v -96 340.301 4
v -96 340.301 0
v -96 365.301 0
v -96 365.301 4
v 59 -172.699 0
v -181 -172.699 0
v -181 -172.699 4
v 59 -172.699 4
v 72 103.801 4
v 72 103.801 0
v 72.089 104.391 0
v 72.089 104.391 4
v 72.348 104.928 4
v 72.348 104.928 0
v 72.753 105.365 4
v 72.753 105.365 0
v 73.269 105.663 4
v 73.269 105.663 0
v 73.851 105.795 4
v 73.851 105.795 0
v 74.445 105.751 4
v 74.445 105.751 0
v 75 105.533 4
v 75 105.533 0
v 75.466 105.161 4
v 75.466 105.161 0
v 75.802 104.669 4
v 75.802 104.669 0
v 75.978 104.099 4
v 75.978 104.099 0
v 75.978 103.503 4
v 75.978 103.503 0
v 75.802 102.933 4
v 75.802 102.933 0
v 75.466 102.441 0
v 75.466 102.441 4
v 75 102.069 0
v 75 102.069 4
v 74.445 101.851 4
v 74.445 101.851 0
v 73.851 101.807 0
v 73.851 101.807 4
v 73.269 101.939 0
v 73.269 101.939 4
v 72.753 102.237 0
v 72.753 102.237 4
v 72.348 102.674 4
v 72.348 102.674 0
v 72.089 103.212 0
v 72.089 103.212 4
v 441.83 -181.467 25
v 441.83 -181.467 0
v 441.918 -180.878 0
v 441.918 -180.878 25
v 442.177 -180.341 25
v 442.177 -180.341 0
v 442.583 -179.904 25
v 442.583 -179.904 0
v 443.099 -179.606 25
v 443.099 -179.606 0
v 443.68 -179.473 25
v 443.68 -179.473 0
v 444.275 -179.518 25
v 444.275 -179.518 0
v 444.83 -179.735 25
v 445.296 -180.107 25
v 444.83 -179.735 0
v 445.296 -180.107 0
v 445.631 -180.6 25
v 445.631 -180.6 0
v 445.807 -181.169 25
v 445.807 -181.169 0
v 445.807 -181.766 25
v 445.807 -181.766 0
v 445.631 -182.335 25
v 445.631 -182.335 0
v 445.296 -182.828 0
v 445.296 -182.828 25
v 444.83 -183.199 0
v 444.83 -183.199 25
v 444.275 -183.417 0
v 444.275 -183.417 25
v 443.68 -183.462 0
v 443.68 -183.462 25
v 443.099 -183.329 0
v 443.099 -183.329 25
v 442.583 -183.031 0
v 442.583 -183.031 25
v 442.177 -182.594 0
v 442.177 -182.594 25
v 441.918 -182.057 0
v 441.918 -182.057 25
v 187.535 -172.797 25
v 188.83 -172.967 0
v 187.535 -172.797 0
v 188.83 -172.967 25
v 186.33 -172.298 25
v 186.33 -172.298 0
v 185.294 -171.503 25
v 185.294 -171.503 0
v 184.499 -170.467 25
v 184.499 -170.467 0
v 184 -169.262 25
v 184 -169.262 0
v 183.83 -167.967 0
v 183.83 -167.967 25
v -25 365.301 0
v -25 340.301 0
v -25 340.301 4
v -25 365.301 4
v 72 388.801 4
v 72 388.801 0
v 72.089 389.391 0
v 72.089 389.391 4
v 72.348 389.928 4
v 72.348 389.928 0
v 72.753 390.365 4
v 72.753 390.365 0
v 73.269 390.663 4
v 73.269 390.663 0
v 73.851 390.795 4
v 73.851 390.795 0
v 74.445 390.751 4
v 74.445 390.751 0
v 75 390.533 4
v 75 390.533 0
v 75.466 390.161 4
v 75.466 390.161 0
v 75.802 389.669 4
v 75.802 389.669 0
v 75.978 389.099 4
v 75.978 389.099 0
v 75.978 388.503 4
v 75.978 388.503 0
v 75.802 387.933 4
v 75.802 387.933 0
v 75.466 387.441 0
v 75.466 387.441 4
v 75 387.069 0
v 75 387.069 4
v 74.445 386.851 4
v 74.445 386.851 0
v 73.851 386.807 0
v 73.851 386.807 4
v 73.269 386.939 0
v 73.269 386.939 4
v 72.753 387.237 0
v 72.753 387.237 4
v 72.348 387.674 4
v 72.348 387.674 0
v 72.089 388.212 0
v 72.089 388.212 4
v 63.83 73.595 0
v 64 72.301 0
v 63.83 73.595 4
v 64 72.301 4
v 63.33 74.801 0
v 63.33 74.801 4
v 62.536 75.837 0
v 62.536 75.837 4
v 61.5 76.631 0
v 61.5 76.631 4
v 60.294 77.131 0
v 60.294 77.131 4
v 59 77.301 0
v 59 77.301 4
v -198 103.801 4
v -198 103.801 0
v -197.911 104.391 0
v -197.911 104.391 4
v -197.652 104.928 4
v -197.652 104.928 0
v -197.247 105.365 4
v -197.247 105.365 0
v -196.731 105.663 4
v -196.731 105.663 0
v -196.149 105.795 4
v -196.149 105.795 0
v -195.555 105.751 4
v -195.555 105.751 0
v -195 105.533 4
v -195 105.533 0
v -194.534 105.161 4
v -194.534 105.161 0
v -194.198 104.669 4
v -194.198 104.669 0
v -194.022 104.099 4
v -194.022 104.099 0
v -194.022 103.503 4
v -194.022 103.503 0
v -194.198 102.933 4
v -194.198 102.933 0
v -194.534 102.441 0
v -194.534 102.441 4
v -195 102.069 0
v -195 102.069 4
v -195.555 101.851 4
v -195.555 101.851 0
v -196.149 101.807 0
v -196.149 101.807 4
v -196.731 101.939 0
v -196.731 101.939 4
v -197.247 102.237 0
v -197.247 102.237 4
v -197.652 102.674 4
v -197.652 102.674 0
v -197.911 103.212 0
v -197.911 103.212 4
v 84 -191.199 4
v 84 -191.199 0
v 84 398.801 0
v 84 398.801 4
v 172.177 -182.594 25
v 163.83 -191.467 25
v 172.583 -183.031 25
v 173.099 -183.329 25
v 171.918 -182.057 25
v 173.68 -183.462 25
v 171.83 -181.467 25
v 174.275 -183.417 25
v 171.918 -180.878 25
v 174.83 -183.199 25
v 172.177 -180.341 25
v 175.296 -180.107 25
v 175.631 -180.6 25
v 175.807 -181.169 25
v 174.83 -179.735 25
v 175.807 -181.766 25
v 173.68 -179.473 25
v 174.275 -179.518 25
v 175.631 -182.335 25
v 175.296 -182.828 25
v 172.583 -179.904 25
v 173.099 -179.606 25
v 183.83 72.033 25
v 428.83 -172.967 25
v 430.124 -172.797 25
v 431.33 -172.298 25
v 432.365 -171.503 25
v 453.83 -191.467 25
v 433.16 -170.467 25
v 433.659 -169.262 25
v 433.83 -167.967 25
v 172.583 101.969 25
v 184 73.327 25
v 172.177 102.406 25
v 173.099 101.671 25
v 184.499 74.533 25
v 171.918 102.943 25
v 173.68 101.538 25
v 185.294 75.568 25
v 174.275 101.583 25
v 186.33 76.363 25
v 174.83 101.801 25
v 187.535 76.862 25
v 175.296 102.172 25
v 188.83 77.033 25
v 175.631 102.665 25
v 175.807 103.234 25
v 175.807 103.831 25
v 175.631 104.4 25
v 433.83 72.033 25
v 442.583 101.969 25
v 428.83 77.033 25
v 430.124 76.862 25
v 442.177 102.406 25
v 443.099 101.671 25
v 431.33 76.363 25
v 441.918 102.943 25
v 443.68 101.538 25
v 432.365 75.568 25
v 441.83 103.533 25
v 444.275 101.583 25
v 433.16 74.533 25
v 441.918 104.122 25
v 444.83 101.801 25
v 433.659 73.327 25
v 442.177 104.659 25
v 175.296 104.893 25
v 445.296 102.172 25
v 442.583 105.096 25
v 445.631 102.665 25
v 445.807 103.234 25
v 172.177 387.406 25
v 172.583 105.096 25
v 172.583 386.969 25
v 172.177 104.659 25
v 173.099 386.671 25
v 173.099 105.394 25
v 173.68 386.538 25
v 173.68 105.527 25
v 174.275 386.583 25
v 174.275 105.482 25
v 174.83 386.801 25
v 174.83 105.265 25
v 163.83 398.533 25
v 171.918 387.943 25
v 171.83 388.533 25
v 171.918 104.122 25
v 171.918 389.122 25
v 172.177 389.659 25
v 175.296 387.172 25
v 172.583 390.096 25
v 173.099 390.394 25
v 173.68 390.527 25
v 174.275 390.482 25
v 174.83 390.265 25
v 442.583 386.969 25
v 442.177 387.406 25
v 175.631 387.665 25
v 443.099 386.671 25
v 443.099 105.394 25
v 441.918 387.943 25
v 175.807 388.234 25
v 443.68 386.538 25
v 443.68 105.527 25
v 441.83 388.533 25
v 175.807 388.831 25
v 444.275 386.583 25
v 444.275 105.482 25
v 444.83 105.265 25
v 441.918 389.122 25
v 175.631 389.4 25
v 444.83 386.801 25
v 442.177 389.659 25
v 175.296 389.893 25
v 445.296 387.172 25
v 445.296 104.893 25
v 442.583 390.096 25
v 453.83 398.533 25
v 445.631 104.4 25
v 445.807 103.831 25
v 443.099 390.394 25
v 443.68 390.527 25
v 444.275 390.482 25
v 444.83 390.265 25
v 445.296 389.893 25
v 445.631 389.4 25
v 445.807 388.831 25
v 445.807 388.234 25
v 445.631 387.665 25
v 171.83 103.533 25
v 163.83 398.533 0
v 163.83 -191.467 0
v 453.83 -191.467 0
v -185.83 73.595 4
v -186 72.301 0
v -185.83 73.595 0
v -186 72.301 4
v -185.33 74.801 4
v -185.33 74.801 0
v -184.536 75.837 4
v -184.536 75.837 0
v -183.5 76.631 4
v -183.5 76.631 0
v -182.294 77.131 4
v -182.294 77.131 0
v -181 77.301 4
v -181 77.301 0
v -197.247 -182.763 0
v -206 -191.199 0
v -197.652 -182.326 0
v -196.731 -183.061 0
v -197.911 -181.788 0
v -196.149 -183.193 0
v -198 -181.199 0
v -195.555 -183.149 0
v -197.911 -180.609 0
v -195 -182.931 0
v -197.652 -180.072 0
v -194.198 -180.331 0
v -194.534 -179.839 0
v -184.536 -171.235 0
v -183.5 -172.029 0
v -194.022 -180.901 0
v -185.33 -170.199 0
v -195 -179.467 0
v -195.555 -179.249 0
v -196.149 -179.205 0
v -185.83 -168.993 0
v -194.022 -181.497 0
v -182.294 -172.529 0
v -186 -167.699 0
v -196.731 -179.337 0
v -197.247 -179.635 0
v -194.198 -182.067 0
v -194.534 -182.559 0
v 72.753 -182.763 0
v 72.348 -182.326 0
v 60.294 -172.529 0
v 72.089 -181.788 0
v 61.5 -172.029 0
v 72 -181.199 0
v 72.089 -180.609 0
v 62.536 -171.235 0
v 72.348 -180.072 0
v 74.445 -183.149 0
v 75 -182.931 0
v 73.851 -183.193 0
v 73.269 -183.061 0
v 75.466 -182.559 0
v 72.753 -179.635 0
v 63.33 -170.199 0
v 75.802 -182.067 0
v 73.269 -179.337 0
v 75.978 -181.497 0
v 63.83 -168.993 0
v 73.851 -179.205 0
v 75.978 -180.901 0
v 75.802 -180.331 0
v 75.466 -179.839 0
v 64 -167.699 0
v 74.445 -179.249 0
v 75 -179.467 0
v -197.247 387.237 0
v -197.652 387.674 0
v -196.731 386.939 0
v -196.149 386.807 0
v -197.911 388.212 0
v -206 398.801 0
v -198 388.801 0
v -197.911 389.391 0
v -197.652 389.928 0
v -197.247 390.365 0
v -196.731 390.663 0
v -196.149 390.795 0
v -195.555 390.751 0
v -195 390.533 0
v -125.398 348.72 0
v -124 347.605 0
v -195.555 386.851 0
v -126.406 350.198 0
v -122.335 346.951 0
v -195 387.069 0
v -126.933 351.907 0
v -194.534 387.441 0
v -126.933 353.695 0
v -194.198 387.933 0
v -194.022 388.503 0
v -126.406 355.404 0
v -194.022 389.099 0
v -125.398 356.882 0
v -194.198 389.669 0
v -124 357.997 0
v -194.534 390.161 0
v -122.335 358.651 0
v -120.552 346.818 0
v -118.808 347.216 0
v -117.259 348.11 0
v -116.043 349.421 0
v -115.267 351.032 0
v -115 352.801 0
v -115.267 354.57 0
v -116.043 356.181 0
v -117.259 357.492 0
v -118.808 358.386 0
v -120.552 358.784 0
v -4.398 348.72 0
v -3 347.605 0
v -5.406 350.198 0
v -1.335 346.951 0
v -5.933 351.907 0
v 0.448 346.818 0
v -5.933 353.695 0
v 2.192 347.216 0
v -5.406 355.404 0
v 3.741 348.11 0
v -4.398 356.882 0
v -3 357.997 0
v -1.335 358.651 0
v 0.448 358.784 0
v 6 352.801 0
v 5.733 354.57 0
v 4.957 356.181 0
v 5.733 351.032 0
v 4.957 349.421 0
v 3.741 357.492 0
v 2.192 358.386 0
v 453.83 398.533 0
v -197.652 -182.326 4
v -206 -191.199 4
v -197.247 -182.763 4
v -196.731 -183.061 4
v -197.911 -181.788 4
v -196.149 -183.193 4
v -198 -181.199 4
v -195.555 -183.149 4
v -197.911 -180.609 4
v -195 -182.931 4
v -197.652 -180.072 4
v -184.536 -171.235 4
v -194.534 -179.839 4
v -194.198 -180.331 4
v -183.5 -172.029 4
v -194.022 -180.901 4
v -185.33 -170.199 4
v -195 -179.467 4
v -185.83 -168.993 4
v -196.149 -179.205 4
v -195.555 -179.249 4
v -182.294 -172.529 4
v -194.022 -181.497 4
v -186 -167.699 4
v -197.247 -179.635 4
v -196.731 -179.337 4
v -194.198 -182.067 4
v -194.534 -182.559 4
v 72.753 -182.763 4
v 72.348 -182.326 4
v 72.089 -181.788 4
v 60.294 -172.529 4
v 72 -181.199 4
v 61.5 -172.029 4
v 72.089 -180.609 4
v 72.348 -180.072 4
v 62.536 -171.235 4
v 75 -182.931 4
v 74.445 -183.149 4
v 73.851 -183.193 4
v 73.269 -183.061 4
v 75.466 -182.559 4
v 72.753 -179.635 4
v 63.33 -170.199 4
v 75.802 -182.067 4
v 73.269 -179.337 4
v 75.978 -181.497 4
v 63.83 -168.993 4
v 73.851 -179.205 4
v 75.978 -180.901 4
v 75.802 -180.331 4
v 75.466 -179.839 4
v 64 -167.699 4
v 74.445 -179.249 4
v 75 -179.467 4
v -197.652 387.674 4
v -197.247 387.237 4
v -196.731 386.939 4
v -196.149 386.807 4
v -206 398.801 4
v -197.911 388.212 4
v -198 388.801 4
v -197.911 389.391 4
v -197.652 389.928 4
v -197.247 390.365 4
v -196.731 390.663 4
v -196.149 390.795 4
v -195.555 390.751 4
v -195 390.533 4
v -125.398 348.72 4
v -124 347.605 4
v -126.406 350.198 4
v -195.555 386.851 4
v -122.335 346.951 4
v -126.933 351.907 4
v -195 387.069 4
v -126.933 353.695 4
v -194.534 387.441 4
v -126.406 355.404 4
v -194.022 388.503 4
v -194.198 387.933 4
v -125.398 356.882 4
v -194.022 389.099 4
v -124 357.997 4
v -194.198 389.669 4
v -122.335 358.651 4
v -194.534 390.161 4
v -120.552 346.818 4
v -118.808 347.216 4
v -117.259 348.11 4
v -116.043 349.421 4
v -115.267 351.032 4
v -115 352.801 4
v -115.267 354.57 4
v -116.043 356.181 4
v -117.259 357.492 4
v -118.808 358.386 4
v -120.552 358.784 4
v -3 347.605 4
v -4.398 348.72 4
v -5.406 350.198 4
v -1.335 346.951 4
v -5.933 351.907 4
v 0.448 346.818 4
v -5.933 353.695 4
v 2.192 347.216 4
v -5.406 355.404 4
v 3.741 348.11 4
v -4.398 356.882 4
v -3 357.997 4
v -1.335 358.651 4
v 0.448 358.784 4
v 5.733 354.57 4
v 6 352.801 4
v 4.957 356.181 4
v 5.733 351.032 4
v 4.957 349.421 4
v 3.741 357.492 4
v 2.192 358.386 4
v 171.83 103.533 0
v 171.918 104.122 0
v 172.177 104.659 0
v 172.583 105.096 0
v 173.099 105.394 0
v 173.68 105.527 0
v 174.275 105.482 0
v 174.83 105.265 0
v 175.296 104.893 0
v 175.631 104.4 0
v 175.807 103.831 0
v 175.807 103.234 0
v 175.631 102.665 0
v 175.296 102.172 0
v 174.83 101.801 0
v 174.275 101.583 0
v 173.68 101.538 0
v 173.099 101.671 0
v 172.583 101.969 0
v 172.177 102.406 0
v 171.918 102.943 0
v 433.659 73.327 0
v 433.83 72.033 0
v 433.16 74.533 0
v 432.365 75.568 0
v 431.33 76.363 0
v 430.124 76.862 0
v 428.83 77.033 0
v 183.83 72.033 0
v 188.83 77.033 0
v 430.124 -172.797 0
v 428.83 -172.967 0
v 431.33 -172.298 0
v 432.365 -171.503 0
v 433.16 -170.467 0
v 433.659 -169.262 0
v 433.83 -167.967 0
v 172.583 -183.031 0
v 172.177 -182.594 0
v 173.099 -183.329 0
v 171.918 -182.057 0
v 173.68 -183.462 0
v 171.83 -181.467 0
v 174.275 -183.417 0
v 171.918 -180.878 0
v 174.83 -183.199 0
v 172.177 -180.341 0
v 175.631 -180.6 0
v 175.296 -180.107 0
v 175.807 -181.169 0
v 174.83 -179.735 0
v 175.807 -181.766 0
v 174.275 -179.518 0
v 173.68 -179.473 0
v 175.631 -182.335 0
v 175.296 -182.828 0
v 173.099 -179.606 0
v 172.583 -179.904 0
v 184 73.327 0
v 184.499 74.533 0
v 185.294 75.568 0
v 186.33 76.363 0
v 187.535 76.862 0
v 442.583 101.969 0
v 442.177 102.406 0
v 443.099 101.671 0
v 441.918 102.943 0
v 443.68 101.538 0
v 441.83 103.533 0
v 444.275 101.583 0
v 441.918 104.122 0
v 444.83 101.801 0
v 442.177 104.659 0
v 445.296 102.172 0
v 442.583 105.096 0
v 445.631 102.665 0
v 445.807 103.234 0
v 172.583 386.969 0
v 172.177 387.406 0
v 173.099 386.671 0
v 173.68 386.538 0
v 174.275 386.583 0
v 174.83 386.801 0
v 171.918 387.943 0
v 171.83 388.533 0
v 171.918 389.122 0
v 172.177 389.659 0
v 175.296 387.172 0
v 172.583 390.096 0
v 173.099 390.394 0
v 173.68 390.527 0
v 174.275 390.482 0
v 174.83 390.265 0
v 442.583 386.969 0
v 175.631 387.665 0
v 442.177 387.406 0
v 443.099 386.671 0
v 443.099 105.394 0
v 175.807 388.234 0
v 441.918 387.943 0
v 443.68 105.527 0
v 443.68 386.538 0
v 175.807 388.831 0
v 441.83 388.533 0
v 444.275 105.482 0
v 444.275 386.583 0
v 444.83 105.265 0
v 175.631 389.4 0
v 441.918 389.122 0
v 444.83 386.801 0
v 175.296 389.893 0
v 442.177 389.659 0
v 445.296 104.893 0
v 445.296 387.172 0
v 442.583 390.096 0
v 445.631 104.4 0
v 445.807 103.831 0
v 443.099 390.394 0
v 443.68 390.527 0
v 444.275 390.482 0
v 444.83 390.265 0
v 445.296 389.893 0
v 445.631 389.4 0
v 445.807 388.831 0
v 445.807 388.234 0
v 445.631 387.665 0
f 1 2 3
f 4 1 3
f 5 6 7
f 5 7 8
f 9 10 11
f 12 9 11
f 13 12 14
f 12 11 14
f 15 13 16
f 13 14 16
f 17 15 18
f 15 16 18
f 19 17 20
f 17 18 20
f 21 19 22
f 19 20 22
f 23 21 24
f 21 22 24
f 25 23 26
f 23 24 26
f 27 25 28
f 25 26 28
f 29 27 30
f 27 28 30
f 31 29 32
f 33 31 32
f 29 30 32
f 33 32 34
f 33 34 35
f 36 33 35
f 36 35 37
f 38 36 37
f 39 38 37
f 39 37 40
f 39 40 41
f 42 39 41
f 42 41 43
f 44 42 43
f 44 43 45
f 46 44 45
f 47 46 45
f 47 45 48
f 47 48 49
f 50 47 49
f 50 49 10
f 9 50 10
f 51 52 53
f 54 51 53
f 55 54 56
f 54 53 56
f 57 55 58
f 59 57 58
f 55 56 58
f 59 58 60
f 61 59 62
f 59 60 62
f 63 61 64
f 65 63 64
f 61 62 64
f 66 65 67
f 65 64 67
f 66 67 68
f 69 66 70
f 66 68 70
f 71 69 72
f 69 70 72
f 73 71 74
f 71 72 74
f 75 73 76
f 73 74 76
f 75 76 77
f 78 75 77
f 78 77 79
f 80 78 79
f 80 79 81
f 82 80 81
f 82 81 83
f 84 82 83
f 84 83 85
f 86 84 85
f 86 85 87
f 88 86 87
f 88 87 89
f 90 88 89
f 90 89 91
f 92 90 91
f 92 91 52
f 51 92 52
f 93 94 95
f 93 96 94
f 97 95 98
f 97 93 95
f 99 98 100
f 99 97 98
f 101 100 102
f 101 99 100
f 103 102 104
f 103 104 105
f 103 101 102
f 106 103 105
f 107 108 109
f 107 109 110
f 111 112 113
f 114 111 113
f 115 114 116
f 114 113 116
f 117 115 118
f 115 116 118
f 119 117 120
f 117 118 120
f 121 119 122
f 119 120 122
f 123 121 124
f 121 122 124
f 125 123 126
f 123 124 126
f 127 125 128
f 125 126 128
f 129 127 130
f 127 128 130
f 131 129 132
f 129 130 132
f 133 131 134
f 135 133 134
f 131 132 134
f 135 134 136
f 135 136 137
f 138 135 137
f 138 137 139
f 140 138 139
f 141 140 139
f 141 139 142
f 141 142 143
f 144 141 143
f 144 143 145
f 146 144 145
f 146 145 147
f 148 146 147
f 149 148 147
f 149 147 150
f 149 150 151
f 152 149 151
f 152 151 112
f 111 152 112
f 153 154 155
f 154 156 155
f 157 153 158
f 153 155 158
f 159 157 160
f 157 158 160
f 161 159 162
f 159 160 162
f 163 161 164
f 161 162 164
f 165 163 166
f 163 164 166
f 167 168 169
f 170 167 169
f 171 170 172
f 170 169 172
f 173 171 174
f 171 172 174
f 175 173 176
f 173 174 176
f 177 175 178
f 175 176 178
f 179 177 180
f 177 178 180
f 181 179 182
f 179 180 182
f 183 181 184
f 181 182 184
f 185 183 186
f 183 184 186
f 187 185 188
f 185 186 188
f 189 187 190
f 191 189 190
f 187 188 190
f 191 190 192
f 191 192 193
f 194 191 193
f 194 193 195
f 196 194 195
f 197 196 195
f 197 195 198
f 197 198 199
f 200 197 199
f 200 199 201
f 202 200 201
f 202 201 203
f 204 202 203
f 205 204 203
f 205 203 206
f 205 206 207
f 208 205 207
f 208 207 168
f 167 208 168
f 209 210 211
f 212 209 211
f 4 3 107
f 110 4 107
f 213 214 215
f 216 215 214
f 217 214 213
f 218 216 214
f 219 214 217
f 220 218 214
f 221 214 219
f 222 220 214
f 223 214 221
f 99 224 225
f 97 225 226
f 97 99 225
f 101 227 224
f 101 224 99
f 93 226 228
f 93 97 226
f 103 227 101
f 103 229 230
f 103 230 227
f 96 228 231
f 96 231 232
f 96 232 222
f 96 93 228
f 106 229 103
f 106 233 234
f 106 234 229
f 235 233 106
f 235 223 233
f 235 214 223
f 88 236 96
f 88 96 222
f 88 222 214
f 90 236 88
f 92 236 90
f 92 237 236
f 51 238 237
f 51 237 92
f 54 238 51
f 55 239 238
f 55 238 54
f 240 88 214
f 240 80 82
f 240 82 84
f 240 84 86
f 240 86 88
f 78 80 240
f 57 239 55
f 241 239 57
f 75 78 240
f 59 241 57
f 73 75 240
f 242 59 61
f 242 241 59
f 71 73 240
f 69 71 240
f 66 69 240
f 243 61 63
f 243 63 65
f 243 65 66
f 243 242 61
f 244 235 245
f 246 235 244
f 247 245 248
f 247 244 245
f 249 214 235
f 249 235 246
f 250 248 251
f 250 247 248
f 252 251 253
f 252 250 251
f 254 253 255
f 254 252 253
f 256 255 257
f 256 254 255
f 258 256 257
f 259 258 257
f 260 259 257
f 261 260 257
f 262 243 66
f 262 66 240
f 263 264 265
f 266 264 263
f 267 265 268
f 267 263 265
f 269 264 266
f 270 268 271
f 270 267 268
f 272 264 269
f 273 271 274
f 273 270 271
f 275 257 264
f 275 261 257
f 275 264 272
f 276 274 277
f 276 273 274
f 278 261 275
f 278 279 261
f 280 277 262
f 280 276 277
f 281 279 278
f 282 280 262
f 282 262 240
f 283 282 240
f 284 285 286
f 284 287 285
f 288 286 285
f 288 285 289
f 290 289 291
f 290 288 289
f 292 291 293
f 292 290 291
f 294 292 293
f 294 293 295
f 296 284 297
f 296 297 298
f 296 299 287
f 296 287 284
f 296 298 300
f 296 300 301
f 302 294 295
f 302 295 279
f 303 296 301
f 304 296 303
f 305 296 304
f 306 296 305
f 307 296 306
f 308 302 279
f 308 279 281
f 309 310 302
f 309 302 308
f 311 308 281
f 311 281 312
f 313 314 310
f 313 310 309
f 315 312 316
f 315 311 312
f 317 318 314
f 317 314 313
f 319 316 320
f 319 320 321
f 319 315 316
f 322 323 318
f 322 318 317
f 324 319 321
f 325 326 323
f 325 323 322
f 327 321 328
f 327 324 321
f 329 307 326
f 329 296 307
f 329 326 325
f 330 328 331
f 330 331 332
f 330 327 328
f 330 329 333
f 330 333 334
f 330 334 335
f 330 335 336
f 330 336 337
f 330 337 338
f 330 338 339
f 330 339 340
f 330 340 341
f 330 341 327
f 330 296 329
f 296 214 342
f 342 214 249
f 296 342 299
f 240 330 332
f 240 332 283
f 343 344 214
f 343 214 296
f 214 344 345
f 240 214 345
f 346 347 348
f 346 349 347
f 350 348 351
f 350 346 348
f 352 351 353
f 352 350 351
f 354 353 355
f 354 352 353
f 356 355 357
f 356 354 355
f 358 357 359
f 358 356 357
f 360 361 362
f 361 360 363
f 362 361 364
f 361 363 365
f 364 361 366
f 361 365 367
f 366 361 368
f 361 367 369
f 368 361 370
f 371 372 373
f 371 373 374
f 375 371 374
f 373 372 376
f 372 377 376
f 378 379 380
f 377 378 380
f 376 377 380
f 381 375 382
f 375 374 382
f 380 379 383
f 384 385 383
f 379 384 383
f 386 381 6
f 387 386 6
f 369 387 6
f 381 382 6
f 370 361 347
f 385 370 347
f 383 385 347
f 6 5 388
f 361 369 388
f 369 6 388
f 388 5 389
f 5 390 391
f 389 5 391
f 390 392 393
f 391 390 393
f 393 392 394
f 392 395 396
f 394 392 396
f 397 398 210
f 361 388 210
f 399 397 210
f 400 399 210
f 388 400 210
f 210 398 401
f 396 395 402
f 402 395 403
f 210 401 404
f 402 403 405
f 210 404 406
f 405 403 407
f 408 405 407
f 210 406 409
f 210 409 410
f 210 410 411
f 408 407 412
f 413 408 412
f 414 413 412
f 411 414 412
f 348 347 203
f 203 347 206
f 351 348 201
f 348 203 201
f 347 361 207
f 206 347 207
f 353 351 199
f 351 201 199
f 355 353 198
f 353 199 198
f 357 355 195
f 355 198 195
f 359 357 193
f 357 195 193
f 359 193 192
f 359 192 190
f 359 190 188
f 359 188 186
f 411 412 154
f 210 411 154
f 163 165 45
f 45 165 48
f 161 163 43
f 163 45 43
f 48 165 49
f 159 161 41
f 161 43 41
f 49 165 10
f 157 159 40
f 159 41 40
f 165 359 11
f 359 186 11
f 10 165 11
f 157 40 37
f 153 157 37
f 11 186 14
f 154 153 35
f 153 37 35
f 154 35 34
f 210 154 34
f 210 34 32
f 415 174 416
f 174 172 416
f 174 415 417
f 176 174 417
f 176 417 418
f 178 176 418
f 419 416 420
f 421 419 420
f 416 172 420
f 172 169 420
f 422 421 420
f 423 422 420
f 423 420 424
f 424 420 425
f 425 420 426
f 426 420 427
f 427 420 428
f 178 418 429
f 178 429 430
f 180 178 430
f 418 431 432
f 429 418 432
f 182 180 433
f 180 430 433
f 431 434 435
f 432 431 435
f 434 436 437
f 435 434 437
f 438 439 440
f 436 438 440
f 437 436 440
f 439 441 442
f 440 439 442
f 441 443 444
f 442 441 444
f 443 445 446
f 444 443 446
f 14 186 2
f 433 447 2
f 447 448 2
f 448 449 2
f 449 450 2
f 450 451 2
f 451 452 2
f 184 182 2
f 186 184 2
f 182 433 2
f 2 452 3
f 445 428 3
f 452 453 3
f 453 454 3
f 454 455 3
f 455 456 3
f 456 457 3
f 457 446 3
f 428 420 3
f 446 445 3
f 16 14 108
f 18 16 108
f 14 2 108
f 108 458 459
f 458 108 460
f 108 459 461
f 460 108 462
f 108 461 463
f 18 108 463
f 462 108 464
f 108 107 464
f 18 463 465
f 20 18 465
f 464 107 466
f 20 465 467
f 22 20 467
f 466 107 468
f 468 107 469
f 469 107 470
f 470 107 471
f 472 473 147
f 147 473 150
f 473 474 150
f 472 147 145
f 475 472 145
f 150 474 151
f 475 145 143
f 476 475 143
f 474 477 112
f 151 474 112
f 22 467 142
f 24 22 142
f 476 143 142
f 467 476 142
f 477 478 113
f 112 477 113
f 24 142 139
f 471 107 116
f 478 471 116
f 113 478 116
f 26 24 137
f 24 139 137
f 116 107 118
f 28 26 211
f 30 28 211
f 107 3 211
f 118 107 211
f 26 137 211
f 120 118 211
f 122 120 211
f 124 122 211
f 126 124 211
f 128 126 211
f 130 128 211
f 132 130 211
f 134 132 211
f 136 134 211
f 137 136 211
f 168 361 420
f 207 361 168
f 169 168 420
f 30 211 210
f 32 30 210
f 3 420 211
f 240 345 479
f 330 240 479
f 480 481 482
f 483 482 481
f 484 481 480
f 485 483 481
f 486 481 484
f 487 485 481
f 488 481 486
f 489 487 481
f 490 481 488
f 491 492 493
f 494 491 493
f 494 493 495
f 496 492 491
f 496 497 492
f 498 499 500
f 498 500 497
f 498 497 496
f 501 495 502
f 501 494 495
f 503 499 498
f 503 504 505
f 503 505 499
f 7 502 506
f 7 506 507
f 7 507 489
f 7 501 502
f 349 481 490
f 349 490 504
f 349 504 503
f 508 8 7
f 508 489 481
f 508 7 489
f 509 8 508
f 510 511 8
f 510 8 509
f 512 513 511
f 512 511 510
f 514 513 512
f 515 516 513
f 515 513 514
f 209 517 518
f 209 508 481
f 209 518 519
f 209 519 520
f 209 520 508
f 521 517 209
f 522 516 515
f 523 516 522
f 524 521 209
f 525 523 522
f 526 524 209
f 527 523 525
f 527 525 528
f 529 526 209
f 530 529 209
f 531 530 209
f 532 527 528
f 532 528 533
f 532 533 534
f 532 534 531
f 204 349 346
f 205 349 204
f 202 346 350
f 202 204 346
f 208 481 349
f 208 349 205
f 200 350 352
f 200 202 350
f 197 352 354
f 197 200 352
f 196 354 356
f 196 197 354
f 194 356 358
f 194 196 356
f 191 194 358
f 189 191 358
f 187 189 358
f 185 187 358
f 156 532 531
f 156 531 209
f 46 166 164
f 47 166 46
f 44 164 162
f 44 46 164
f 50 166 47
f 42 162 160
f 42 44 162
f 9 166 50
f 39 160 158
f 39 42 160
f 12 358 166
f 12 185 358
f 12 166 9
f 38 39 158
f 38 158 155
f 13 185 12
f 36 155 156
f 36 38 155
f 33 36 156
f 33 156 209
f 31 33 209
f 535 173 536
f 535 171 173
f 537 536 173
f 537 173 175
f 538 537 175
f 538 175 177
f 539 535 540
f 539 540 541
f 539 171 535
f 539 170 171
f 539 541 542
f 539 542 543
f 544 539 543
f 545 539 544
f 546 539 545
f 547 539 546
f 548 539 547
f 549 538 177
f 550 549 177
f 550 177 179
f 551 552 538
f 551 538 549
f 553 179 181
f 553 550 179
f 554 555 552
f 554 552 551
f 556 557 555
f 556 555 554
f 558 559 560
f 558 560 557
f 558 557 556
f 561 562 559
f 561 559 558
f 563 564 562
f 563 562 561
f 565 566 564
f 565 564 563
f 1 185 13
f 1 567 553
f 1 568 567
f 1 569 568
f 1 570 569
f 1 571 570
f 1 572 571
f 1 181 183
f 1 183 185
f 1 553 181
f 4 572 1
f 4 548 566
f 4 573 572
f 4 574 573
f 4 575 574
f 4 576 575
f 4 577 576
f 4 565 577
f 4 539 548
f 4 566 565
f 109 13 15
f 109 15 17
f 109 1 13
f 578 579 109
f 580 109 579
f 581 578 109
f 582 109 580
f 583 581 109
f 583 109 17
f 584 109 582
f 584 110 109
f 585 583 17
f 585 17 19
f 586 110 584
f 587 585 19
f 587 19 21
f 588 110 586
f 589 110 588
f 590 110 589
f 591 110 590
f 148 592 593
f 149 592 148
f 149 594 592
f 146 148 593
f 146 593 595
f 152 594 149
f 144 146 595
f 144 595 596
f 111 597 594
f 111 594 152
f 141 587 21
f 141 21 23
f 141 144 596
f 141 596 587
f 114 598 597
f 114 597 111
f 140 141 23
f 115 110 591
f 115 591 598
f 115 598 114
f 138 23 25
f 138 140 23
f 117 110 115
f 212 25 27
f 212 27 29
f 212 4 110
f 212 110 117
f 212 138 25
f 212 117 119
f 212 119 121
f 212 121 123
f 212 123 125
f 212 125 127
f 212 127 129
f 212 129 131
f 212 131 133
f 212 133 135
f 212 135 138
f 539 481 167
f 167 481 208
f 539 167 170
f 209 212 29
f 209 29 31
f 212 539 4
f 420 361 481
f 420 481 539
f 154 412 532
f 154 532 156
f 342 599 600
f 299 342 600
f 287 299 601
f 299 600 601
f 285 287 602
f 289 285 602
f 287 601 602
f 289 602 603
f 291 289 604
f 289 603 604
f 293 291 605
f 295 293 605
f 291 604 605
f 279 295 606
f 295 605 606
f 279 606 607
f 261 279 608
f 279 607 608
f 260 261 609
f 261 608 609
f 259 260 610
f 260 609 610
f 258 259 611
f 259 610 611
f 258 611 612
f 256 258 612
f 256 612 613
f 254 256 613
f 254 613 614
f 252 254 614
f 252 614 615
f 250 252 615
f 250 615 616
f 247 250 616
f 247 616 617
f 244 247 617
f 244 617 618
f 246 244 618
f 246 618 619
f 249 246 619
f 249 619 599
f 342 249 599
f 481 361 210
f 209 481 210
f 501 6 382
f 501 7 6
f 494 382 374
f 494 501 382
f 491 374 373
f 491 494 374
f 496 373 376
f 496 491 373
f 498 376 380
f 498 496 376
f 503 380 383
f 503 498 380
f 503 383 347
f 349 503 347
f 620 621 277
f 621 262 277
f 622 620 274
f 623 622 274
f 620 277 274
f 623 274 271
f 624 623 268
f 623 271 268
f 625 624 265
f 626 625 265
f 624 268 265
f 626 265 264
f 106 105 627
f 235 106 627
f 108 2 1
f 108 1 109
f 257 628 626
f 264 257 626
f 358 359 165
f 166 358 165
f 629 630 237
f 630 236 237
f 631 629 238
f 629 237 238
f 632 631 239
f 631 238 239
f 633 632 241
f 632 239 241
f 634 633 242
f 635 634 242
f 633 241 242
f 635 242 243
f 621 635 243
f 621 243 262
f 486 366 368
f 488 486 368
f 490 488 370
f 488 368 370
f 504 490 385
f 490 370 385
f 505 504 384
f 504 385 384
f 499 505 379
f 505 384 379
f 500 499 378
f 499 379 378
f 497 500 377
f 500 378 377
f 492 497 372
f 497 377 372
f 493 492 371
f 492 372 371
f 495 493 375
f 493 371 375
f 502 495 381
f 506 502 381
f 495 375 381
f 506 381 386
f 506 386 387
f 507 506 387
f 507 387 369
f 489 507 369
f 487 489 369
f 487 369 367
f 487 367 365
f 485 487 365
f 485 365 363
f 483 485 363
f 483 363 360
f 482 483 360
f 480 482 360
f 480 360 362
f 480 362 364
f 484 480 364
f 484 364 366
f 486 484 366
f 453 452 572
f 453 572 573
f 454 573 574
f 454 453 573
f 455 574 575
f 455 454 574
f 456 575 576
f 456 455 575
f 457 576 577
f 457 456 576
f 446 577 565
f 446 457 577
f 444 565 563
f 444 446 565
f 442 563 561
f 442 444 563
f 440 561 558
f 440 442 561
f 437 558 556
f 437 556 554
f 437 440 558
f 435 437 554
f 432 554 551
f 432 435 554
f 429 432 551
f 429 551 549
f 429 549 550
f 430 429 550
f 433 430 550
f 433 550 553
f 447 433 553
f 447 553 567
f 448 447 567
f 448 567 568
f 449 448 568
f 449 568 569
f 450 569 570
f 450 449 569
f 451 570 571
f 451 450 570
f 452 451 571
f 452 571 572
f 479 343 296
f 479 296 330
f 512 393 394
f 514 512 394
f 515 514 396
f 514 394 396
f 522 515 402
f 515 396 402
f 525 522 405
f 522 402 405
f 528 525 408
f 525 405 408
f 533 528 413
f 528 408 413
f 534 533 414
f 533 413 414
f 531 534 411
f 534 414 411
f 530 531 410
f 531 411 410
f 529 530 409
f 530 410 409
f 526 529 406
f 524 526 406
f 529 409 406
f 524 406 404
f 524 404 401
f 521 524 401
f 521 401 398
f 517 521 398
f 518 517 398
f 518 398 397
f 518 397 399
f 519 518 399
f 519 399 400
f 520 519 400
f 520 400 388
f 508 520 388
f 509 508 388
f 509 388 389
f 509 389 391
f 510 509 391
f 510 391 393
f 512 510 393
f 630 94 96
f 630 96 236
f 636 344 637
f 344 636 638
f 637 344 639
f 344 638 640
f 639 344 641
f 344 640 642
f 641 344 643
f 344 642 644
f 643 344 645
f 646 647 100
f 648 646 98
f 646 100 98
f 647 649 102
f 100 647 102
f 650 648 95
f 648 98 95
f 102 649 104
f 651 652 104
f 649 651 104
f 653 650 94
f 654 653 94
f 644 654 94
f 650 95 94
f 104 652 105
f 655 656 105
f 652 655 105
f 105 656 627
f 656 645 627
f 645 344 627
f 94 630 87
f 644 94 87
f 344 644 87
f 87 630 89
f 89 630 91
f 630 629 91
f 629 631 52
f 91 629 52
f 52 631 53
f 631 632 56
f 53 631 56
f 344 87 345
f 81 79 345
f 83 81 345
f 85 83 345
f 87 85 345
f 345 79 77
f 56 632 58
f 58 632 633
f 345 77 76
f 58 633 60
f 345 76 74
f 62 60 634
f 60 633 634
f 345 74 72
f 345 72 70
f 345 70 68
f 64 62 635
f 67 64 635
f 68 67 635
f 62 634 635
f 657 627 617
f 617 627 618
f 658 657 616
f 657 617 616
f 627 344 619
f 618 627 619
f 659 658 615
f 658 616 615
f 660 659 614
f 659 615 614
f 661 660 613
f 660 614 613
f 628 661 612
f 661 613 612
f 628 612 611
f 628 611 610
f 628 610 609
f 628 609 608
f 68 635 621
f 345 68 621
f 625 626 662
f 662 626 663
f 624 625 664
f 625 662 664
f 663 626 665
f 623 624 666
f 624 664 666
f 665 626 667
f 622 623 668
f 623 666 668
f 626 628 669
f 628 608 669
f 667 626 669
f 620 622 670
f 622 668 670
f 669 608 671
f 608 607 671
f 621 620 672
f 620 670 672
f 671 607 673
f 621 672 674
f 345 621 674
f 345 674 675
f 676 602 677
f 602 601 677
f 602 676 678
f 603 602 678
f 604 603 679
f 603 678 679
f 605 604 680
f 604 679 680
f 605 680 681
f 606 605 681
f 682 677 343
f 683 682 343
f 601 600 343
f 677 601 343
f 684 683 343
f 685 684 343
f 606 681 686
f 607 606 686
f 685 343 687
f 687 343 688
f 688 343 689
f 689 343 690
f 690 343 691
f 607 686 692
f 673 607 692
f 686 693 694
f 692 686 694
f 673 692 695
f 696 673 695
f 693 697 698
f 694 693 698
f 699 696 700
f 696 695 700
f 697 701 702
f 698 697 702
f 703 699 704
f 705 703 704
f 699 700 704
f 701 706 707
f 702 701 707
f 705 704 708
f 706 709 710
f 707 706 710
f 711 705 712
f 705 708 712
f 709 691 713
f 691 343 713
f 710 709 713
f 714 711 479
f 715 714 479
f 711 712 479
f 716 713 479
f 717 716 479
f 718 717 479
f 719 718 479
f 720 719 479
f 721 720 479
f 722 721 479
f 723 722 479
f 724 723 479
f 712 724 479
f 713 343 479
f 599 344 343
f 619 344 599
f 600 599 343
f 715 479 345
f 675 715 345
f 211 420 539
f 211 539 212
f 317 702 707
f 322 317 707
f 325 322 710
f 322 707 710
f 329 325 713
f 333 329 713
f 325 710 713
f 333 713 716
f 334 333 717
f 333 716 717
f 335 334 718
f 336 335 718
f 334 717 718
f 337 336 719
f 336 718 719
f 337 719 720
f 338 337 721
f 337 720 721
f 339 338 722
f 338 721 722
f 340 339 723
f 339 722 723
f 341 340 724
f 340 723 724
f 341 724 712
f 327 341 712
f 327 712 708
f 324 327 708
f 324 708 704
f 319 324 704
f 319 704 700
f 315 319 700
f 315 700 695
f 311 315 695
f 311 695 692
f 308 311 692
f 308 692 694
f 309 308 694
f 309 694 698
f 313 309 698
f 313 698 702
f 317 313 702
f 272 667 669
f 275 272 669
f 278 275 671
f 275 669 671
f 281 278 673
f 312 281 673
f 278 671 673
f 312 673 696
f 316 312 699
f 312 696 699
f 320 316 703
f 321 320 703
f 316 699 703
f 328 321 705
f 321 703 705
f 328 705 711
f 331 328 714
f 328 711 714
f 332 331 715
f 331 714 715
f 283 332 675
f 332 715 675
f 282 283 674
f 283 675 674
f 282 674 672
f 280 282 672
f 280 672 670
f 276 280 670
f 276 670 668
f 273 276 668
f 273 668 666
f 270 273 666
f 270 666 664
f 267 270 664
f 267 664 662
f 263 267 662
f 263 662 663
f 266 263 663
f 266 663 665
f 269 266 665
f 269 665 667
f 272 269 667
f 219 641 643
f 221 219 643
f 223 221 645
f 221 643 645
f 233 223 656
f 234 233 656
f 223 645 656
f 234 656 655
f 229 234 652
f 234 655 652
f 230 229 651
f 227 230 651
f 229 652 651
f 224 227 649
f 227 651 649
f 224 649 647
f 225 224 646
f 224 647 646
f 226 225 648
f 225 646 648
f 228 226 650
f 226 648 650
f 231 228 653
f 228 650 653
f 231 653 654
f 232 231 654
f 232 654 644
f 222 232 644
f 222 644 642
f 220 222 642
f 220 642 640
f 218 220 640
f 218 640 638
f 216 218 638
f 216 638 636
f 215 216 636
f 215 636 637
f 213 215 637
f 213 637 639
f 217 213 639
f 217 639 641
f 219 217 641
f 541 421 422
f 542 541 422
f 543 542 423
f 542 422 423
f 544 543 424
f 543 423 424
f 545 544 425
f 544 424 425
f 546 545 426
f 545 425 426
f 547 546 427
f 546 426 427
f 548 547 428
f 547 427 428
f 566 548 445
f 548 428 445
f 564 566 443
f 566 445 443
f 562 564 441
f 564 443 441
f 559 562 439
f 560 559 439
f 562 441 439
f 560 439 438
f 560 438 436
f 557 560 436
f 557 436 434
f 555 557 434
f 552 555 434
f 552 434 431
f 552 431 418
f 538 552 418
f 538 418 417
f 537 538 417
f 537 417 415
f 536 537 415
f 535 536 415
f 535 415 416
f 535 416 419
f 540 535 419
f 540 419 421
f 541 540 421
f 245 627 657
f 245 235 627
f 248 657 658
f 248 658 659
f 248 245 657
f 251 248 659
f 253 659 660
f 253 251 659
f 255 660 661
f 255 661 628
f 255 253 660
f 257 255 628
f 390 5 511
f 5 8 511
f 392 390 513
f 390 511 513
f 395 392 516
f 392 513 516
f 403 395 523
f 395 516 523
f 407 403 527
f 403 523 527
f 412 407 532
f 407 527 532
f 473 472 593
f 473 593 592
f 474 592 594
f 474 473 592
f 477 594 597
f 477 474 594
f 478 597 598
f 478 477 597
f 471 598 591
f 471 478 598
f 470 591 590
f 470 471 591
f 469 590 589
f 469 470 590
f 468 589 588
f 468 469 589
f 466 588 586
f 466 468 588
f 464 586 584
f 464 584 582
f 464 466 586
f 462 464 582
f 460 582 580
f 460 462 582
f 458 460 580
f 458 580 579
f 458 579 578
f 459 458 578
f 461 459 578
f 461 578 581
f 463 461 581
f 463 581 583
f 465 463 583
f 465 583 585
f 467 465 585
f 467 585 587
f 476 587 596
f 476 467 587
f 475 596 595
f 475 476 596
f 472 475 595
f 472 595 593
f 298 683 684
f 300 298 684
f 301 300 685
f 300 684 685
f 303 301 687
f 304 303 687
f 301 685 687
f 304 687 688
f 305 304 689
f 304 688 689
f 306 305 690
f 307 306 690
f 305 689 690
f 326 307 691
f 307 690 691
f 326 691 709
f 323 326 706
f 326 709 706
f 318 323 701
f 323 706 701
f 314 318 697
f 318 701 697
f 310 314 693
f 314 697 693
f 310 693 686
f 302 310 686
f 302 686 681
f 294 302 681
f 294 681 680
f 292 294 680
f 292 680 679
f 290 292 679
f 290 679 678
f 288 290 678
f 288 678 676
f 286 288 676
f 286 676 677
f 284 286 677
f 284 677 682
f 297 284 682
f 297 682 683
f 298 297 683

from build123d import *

# Parameters (mm, degrees)
F0_W     = 290
F0_H     = 590
F0_W_2   = 250
F0_H_2   = 250
F0_R     = 6
F0_W_3   = 71
F0_H_3   = 25
F1_DEPTH = 4
F3_D     = 4
F4_W     = 290
F4_H     = 590
F4_W_2   = 250
F4_H_2   = 250
F5_DEPTH = 25
F7_D     = 4
F8_R     = 5
F9_R     = 5


with BuildPart() as f1:
    # F0 (on Top) → F1 (new body)
    with BuildSketch(Plane.XY):
        with Locations((-61, 103.801025)):
            Rectangle(F0_W, F0_H)
        with Locations((-61, -47.698975)):
            Rectangle(F0_W_2, F0_H_2, mode=Mode.SUBTRACT)
        with Locations((-121, 352.801025)):
            Circle(F0_R, mode=Mode.SUBTRACT)
        with Locations((-60.5, 352.801025)):
            Rectangle(F0_W_3, F0_H_3, mode=Mode.SUBTRACT)
        with Locations((0, 352.801025)):
            Circle(F0_R, mode=Mode.SUBTRACT)
    extrude(amount=F1_DEPTH)

    # F3 (through all)
    with Locations(Plane.XY.offset(4)):
        with Locations((-196, 388.801025), (74, 388.801025), (74, 103.801025), (-196, 103.801025), (-196, -181.198975), (74, -181.198975)):
            Hole(F3_D / 2)

    # F9
    f9_edges = [f1.edges().sort_by_distance(p)[0] for p in [
        (64, 77.301025, 2),
        (-186, 77.301025, 2),
        (64, -172.698975, 2),
        (-186, -172.698975, 2),
    ]]
    fillet(f9_edges, radius=F9_R)


with BuildPart() as f5:
    # F4 (on Top) → F5 (new body)
    with BuildSketch(Plane.XY):
        with Locations((308.829527, 103.532581)):
            Rectangle(F4_W, F4_H)
        with Locations((308.829527, -47.967419)):
            Rectangle(F4_W_2, F4_H_2, mode=Mode.SUBTRACT)
    extrude(amount=F5_DEPTH)

    # F7 (through all)
    with Locations(Plane.XY.offset(25)):
        with Locations((173.829527, 388.532581), (443.829527, 388.532581), (443.829527, 103.532581), (173.829527, 103.532581), (173.829527, -181.467419), (443.829527, -181.467419)):
            Hole(F7_D / 2)

    # F8
    f8_edges = [f5.edges().sort_by_distance(p)[0] for p in [
        (433.829527, 77.032581, 12.5),
        (183.829527, 77.032581, 12.5),
        (433.829527, -172.967419, 12.5),
        (183.829527, -172.967419, 12.5),
    ]]
    fillet(f8_edges, radius=F8_R)


solid = Compound([f1.part, f5.part])
